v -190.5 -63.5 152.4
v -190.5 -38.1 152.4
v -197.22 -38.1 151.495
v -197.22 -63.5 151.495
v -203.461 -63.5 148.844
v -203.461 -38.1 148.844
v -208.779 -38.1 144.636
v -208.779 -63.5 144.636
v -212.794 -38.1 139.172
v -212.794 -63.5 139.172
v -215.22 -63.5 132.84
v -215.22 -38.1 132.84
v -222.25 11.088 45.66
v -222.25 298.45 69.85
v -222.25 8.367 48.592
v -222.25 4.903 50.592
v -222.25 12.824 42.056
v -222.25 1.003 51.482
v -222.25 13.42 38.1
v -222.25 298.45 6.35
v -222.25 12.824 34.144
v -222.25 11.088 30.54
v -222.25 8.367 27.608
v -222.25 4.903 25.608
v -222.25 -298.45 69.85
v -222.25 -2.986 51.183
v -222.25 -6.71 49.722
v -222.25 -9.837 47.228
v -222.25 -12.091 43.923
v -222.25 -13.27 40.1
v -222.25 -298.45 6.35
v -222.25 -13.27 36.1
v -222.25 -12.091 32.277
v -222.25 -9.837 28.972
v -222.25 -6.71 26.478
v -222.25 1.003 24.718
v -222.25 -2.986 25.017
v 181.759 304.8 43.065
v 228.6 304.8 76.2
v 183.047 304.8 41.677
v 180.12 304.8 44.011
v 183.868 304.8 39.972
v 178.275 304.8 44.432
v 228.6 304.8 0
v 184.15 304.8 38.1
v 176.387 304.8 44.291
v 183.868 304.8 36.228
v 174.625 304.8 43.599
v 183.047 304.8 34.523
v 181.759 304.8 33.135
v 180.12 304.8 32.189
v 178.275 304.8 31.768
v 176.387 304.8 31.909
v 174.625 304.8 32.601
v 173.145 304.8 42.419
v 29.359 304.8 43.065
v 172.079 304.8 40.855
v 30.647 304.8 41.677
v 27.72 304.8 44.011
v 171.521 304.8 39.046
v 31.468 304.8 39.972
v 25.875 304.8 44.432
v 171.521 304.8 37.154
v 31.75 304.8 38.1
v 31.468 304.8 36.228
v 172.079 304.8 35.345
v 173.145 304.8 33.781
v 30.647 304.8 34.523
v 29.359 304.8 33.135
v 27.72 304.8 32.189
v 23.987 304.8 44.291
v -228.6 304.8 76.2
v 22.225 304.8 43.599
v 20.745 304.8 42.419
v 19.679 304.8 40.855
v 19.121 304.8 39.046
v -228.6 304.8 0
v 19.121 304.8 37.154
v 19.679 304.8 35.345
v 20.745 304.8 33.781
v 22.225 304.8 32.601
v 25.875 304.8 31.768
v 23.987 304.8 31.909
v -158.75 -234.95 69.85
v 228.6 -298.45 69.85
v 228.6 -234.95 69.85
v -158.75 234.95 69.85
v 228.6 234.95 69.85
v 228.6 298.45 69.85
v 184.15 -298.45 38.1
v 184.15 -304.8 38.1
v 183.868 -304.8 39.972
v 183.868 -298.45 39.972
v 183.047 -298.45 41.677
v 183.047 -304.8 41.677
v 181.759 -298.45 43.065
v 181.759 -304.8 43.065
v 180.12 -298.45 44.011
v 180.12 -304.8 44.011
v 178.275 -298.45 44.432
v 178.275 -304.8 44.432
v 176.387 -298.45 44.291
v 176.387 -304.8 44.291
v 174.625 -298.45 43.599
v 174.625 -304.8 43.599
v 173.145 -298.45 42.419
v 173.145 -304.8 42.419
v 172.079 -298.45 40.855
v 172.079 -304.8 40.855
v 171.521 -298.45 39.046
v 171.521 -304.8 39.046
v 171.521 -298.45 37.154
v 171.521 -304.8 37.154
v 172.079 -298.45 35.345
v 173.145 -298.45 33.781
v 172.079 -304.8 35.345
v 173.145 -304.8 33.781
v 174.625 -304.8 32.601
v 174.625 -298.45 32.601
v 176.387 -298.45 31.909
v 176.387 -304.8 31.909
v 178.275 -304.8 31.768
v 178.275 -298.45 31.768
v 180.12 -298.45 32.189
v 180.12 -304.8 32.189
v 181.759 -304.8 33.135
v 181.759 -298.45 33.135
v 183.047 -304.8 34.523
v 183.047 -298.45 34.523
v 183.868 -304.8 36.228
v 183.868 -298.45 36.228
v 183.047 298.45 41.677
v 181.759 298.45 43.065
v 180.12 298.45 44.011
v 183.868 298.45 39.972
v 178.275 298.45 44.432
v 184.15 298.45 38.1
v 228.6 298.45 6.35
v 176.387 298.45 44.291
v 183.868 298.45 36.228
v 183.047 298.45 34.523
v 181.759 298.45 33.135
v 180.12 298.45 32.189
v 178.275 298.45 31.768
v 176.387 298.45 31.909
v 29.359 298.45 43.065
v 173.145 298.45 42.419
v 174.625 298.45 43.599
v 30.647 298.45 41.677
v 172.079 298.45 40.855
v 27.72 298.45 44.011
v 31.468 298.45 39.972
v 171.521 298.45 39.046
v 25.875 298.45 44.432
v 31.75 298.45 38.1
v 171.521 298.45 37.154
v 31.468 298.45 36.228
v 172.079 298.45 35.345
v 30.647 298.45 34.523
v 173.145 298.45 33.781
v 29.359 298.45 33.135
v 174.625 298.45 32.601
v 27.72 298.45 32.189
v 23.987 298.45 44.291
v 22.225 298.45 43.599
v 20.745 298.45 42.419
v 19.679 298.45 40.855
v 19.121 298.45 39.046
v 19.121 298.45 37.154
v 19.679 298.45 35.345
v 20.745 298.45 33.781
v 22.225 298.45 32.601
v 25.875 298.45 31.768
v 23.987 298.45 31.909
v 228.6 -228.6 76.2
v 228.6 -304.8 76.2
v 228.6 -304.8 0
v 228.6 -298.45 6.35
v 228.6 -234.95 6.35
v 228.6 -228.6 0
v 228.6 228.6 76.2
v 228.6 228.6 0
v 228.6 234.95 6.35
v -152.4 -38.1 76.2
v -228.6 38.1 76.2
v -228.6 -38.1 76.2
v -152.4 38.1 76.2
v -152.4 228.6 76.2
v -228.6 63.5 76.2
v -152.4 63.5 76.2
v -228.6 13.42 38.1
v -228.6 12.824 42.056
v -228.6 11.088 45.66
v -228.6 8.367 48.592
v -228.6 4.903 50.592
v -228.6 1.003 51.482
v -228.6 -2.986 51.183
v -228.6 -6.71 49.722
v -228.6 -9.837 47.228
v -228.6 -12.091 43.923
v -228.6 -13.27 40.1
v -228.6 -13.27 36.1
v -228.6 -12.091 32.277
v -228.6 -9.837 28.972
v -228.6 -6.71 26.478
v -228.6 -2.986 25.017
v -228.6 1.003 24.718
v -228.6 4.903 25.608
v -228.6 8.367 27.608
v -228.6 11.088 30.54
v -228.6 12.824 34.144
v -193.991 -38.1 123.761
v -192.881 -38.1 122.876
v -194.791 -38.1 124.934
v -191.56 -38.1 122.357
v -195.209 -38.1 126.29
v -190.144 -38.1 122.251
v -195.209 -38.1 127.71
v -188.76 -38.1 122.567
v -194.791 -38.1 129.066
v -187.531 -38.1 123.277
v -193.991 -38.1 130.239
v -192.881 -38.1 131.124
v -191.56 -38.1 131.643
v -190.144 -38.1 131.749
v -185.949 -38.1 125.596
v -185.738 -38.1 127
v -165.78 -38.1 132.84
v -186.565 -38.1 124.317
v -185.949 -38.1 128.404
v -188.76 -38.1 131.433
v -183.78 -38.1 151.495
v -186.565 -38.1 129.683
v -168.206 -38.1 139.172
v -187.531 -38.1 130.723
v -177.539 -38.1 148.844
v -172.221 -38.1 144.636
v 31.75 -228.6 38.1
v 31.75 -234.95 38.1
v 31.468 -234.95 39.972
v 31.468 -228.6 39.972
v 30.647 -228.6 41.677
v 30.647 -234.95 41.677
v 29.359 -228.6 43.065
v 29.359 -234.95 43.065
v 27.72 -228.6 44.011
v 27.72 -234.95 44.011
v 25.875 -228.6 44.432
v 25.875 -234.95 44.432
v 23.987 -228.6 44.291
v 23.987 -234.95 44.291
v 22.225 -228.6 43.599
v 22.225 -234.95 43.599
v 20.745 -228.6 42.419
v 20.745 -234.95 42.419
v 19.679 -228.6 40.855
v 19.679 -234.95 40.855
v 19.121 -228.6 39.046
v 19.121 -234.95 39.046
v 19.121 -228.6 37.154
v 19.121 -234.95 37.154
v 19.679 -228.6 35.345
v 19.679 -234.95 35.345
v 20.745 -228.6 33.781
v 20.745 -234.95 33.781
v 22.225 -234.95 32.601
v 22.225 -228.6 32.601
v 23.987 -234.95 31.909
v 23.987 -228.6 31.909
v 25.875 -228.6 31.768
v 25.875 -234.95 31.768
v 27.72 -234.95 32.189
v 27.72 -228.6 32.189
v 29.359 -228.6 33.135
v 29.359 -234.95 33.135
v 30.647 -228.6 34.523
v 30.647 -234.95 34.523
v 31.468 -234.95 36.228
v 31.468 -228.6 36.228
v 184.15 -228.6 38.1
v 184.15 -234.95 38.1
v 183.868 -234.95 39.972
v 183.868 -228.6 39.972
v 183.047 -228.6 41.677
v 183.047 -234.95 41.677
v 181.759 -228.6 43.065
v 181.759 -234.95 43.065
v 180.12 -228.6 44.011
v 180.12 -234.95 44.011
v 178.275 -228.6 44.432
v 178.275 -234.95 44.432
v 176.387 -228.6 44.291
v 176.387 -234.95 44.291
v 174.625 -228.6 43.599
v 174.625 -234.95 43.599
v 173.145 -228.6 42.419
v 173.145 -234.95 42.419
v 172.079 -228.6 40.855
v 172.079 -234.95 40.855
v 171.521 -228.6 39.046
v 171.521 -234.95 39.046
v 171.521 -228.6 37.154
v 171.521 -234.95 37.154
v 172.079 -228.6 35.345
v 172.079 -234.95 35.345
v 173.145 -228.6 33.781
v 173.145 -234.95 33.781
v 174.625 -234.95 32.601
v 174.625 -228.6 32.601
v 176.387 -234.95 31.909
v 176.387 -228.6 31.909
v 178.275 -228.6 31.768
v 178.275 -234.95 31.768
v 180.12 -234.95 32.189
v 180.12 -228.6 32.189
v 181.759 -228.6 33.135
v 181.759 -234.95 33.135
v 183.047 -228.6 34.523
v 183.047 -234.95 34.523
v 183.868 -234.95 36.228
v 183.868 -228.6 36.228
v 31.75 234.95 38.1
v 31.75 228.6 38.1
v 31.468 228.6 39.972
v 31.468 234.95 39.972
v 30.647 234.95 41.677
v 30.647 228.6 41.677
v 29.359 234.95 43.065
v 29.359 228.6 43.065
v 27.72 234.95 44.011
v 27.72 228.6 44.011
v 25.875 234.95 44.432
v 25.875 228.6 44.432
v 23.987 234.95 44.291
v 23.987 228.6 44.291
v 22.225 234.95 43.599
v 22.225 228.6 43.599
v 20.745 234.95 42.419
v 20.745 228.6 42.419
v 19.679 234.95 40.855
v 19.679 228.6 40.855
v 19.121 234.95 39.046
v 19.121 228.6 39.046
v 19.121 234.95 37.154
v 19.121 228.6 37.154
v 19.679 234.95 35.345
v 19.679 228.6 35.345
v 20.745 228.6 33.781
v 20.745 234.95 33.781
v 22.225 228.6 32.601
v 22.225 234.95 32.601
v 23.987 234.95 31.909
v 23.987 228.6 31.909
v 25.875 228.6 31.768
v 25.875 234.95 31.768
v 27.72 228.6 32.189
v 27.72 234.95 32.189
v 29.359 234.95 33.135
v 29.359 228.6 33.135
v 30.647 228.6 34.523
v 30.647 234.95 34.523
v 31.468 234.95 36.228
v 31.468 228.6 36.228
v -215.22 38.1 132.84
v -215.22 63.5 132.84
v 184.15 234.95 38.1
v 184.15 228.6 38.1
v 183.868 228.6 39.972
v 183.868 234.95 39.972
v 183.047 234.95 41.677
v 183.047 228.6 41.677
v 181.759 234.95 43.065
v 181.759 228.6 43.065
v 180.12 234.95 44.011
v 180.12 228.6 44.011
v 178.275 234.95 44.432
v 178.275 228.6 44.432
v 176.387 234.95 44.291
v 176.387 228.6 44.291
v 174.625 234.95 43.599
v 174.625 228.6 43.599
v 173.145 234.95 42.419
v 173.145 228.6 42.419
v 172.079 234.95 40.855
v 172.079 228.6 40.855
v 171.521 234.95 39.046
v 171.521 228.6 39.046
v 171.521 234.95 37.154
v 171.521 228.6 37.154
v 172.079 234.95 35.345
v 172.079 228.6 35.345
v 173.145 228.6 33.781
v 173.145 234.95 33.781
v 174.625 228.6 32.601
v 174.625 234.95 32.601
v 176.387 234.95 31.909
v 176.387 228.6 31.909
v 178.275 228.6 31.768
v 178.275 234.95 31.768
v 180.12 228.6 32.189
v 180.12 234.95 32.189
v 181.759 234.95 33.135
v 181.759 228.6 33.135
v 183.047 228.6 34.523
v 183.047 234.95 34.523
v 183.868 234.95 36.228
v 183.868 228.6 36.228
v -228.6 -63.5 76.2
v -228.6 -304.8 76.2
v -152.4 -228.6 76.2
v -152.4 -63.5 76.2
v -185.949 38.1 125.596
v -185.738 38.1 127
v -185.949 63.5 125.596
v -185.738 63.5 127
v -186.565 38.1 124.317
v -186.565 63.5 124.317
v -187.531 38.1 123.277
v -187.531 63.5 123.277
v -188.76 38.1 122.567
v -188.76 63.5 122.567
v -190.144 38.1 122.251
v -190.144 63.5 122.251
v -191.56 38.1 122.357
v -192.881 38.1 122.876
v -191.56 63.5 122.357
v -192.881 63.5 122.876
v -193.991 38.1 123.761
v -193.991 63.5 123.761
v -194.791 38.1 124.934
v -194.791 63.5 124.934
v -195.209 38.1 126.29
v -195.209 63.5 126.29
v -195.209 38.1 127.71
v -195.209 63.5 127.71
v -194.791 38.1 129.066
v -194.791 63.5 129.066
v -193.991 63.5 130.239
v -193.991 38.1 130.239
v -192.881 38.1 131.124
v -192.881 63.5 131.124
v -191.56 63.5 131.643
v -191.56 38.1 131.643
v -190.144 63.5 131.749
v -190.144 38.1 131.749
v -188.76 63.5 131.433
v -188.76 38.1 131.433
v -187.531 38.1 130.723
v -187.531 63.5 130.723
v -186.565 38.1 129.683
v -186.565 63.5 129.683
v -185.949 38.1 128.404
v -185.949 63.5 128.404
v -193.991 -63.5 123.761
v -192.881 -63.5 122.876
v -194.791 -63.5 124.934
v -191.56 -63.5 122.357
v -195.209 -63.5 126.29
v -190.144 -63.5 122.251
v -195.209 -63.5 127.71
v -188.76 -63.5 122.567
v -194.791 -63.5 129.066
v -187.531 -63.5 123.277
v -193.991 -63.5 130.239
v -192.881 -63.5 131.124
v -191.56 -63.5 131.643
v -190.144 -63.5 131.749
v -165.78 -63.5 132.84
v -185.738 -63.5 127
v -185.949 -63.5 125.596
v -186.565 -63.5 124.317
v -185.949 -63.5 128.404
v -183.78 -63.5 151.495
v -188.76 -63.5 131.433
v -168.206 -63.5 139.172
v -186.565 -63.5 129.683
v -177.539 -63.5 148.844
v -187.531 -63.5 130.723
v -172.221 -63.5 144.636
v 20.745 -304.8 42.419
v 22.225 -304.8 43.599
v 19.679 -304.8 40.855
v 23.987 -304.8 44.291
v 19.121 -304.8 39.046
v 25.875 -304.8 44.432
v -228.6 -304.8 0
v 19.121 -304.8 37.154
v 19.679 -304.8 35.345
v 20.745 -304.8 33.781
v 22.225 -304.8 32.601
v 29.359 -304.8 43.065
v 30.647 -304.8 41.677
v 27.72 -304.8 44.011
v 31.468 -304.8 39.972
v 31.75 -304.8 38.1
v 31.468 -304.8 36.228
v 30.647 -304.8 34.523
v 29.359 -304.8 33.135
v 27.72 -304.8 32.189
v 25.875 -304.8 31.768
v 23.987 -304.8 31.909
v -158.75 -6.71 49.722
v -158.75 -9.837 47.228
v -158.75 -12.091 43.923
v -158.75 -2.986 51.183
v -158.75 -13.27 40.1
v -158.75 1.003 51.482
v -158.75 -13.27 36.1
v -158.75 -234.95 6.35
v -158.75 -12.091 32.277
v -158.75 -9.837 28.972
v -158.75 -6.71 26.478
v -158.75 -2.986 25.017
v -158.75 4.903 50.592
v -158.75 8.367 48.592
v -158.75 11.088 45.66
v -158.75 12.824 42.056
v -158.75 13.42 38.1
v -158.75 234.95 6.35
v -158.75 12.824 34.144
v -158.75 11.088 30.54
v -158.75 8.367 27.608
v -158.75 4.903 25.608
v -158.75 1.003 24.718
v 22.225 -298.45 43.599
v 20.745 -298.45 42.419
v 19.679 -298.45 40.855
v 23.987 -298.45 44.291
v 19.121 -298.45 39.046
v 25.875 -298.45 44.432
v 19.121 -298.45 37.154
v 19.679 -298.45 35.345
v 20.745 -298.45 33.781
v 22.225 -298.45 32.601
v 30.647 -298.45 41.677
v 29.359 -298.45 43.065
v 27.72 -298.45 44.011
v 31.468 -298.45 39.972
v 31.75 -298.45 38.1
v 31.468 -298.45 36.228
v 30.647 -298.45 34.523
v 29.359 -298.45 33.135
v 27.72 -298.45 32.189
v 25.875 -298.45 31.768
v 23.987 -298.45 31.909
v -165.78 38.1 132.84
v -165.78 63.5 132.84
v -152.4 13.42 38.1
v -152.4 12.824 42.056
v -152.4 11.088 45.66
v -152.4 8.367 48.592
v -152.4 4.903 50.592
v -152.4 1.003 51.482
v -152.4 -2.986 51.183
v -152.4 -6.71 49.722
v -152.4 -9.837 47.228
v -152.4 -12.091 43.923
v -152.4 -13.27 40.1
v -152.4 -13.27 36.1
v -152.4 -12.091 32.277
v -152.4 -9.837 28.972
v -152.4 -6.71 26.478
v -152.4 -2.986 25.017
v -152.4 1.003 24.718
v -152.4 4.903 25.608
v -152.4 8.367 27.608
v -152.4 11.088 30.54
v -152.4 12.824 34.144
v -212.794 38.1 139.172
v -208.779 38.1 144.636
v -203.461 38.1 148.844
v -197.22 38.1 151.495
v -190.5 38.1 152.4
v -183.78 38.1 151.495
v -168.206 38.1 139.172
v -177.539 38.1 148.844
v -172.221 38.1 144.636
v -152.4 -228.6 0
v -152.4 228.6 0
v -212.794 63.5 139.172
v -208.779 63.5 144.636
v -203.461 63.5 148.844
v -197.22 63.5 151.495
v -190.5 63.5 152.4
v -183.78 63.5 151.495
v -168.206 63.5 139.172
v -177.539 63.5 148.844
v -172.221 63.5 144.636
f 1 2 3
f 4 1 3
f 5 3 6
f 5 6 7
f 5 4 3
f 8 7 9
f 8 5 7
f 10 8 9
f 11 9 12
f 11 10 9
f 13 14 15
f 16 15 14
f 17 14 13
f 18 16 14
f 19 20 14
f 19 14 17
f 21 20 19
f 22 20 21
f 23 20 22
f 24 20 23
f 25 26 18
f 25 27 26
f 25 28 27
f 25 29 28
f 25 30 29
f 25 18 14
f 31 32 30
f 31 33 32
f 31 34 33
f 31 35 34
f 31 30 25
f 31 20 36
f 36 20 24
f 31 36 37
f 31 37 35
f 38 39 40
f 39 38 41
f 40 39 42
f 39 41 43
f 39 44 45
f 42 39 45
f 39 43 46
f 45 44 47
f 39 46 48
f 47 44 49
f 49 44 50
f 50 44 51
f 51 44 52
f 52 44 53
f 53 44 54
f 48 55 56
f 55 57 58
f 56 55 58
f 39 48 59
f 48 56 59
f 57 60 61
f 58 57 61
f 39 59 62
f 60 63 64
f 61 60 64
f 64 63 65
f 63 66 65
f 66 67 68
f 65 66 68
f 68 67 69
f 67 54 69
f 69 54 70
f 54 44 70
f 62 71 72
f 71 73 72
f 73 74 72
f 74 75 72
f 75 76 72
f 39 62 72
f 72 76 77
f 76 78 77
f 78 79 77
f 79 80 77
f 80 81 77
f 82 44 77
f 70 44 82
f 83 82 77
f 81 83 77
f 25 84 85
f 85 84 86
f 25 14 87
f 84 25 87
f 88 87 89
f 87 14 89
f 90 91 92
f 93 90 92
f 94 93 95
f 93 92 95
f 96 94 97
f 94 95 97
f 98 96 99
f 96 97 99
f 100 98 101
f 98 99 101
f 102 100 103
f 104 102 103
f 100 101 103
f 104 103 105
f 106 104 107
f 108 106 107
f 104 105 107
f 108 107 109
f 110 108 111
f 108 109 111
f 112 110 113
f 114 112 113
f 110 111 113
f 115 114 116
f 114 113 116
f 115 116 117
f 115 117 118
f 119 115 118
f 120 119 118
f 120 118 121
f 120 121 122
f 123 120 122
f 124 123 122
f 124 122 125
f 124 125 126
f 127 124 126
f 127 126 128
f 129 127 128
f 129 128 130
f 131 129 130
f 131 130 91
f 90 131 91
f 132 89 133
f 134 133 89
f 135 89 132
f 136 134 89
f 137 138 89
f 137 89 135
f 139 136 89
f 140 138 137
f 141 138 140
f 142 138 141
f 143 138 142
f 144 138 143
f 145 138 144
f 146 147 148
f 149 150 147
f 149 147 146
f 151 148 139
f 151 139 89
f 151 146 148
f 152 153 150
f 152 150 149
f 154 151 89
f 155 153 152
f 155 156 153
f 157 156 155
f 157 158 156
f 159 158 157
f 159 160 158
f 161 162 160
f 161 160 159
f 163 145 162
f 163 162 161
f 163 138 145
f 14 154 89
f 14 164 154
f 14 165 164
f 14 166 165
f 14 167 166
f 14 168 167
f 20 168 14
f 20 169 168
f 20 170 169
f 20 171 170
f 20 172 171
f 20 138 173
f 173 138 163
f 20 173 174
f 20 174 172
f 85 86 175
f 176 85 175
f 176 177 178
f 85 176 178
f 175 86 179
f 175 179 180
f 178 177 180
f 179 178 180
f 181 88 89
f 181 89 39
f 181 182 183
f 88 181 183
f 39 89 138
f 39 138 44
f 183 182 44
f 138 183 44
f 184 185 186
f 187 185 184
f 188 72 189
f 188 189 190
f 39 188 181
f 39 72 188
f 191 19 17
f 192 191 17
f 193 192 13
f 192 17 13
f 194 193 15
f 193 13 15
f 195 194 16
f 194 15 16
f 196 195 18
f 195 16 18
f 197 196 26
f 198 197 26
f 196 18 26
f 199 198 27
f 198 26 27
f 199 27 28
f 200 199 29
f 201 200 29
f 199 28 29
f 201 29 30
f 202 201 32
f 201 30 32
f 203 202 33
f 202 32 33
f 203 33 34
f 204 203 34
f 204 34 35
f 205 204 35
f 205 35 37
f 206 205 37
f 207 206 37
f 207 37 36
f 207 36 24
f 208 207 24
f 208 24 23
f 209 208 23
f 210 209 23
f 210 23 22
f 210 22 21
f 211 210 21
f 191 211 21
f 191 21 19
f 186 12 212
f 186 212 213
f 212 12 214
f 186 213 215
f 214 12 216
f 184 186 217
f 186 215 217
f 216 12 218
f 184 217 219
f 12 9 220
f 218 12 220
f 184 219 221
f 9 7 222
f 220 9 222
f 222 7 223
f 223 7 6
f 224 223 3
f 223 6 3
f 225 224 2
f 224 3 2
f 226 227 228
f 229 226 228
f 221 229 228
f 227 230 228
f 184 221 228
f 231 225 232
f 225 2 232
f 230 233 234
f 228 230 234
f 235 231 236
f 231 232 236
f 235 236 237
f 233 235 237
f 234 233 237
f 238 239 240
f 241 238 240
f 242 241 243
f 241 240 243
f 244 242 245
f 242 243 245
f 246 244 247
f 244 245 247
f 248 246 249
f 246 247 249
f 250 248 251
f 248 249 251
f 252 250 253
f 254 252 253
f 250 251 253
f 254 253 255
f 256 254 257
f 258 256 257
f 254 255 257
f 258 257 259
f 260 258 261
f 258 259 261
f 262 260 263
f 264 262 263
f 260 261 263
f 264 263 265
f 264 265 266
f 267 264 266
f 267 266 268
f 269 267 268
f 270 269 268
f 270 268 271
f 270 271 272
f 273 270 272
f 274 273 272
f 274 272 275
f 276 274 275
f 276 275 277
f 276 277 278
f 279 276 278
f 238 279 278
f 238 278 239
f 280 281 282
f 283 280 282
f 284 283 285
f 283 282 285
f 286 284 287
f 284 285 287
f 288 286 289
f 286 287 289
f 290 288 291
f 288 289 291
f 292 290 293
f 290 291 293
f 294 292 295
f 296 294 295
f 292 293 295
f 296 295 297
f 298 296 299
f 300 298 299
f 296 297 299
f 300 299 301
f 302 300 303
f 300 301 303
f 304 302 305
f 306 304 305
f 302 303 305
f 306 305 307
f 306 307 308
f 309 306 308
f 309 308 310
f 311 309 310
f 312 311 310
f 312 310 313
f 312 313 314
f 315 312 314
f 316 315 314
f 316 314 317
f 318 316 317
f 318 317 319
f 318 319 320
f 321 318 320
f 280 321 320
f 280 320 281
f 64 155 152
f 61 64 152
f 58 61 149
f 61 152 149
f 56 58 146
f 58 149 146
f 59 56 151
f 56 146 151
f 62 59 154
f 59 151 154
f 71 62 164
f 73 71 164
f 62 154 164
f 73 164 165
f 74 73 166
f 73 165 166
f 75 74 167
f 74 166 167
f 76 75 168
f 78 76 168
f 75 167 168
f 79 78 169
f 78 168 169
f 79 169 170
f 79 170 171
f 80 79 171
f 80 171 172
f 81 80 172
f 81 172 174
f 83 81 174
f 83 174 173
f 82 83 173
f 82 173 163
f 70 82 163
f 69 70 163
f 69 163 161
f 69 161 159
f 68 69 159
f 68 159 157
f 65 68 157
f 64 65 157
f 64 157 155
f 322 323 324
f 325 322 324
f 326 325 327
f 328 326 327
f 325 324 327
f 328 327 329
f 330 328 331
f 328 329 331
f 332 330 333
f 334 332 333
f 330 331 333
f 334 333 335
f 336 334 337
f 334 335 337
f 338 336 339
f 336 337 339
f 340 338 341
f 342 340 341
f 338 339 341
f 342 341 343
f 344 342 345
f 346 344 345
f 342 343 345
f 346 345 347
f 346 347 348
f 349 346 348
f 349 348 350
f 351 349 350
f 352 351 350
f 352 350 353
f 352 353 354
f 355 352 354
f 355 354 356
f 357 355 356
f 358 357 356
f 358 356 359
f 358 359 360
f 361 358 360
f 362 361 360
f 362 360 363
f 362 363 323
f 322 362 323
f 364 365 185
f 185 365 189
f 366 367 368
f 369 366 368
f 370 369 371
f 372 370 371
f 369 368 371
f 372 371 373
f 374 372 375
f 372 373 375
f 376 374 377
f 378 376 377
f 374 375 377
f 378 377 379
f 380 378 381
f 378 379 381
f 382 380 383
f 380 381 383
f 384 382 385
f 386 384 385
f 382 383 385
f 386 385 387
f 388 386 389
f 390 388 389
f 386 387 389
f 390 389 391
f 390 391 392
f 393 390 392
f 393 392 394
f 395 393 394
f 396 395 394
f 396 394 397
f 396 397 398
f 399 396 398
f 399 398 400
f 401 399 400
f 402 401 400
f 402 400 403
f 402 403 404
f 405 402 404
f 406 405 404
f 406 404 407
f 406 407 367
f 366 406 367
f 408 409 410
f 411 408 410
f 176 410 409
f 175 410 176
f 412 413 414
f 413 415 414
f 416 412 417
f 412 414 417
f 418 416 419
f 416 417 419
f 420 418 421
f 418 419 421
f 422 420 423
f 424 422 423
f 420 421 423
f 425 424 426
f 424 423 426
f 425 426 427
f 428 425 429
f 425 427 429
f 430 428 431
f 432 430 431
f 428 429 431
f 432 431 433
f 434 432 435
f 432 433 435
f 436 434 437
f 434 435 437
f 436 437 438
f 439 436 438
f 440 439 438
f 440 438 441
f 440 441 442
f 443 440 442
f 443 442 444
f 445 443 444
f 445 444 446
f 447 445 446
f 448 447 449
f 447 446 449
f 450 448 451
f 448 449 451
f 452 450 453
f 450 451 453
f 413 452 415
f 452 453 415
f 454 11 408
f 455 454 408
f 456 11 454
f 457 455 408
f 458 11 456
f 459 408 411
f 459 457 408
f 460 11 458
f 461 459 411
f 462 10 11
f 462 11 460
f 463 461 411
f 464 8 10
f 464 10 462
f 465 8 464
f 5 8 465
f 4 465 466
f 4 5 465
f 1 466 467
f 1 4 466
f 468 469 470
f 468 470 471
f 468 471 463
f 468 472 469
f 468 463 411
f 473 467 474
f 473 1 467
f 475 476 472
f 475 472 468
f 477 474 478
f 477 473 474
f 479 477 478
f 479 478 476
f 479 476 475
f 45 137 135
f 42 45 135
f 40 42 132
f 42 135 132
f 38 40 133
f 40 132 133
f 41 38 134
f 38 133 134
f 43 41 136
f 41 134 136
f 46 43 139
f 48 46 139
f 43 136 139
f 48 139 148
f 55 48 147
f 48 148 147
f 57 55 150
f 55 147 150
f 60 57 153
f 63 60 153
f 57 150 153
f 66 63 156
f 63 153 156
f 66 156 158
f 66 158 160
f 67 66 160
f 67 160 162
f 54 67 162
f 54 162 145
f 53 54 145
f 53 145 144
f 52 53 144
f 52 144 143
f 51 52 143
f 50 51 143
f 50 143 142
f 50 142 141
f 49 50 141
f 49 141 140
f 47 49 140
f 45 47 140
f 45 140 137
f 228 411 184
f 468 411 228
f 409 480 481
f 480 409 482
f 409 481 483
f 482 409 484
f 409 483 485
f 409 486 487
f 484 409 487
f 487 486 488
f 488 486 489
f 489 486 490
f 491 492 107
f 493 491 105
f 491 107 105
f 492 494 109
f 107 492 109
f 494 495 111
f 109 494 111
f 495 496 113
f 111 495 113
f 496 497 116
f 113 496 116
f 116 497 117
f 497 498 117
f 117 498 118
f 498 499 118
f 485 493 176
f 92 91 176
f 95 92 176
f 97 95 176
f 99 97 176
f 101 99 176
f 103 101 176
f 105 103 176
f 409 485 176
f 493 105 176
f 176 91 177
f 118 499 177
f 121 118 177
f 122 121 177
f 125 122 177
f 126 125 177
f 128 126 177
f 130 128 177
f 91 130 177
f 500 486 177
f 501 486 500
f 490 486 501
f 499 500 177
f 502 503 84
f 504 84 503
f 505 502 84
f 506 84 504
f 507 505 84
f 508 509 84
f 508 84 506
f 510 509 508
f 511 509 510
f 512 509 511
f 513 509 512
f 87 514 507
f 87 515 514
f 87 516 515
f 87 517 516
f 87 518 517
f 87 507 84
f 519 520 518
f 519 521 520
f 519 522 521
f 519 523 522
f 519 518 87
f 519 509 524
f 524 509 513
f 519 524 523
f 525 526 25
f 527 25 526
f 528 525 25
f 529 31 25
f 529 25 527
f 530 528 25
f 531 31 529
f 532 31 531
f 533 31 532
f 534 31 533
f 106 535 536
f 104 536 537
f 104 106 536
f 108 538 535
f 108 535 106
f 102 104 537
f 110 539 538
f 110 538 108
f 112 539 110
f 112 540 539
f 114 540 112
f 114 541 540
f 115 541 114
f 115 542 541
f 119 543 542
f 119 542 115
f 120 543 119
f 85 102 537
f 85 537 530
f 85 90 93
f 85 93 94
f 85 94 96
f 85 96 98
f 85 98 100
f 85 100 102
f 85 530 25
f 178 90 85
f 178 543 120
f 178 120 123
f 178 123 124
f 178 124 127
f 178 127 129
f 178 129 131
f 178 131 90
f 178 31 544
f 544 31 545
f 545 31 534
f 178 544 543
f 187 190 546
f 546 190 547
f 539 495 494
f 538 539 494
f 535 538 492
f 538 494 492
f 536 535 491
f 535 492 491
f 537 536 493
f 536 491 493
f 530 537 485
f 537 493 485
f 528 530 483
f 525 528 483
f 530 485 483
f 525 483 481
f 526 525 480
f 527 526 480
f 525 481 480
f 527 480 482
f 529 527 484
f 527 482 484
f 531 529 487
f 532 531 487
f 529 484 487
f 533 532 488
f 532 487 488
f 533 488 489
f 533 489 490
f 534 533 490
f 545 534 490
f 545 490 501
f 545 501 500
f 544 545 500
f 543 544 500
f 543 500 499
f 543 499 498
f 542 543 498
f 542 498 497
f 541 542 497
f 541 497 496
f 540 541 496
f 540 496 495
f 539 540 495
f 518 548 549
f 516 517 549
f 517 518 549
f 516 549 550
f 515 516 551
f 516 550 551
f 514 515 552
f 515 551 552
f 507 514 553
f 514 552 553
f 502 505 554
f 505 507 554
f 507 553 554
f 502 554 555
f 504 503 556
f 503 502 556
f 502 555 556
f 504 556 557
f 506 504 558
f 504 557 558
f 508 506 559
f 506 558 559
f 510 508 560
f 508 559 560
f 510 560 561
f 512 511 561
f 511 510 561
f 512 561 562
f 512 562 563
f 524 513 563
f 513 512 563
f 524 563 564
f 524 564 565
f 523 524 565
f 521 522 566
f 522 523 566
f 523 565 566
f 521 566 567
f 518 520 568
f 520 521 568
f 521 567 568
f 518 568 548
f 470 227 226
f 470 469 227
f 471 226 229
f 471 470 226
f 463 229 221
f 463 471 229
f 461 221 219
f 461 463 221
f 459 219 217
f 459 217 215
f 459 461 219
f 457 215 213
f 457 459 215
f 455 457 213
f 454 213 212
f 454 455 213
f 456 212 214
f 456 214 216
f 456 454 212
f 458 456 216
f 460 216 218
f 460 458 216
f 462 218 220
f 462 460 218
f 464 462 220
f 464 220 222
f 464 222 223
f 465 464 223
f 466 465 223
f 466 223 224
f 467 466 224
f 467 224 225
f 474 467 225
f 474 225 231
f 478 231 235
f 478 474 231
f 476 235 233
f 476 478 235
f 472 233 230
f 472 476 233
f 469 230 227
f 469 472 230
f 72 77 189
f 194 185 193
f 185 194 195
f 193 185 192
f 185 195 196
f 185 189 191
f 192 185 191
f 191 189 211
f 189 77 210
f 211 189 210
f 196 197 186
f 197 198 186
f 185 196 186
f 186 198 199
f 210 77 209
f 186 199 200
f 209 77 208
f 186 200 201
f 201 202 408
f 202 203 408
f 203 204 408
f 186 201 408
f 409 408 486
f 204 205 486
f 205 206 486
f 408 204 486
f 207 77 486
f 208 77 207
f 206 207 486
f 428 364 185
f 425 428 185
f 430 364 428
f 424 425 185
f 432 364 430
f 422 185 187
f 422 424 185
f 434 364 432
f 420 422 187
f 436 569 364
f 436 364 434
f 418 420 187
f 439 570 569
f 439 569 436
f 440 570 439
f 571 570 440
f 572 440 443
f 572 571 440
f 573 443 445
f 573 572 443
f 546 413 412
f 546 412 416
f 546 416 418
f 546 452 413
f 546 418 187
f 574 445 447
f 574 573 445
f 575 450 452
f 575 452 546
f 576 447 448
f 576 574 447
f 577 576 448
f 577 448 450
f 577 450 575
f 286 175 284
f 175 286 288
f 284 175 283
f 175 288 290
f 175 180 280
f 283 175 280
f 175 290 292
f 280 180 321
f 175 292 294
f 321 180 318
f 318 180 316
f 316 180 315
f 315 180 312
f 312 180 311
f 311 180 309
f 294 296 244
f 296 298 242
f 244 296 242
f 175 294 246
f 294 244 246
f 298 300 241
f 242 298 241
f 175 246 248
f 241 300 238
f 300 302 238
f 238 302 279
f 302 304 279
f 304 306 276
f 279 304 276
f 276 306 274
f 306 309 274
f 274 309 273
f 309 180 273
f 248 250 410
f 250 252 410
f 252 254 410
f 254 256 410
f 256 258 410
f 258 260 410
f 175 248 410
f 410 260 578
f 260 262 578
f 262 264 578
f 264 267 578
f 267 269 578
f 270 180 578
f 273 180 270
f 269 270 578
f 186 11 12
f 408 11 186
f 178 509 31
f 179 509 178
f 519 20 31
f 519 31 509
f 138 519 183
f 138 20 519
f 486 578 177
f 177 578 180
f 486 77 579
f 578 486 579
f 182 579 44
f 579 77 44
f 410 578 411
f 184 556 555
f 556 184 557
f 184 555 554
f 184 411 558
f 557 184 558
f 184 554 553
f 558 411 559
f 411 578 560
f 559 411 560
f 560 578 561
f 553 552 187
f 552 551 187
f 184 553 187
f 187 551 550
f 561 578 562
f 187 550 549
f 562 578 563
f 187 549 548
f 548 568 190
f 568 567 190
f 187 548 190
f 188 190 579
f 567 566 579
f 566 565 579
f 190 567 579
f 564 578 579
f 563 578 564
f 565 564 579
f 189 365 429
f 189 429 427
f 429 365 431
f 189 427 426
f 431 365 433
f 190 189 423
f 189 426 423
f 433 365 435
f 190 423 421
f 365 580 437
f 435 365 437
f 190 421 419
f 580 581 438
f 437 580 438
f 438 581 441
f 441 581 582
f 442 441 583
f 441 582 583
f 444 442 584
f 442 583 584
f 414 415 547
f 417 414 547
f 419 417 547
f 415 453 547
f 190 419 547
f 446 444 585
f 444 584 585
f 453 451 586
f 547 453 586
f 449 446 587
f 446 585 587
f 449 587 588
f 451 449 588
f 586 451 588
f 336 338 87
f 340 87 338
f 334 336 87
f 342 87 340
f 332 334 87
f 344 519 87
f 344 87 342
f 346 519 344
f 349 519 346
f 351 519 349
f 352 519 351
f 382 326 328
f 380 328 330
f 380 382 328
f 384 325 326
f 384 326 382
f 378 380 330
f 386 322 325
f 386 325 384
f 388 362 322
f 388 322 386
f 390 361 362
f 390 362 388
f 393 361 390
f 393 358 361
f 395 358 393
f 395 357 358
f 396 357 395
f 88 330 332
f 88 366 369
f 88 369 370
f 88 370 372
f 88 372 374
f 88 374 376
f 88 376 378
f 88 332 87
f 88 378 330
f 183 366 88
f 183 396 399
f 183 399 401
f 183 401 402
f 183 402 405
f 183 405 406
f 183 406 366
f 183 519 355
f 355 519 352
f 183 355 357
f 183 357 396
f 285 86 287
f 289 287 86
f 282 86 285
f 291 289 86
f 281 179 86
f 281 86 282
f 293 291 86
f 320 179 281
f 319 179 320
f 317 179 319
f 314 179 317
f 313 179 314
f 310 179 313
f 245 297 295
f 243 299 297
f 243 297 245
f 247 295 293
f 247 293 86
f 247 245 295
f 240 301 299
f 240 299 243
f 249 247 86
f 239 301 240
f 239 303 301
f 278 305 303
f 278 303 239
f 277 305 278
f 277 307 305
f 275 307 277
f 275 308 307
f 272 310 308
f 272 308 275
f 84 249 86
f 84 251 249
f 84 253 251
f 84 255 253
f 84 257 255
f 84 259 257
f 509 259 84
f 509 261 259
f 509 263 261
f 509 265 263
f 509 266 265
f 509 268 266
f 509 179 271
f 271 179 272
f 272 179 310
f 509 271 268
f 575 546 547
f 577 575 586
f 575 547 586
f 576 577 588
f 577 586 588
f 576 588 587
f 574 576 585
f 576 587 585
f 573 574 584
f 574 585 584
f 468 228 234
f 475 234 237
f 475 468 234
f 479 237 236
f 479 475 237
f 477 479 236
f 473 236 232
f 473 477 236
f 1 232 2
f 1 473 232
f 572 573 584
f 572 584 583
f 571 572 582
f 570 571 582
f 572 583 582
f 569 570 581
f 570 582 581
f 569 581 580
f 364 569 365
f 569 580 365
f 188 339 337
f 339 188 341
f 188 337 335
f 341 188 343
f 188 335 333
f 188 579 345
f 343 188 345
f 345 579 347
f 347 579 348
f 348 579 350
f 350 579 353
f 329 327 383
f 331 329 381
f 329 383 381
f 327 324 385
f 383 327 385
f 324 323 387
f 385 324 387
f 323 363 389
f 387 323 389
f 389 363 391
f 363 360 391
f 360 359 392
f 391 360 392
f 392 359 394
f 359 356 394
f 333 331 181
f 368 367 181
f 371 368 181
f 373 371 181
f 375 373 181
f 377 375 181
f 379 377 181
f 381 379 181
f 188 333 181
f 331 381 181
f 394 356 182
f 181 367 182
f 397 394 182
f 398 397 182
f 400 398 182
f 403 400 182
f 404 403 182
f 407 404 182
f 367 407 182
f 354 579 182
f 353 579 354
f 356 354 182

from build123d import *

# Parameters (mm, degrees)
F1_DEPTH = 76.2
F2_T     = -6.35
F4_D     = 12.7
F7_DEPTH = 12.7
F8_R     = 13.4197326433
F9_DEPTH = 228.601


# Not quite as in the source:
# - a feature names something its author has since deleted; it is built from what else it names


with BuildPart() as f1:
    # F0 (on Top) → F1 (new body)
    with BuildSketch(Plane.XY):
        Polygon((-228.6, 304.8), (-228.6, -304.8), (228.6, -304.8), (228.6, -228.6), (-152.4, -228.6), (-152.4, 228.6), (228.6, 228.6), (228.6, 304.8), align=None)
    extrude(amount=F1_DEPTH)

    # F2
    f2_openings = [f1.faces().sort_by_distance(p)[0] for p in [
        (228.6, -266.7, 38.1),
        (228.6, 266.7, 38.1),
    ]]
    offset(amount=F2_T, openings=f2_openings, kind=Kind.INTERSECTION)

    # F4 (through all)
    with Locations(Plane(origin=(0, 304.8, 0), x_dir=(-1, 0, 0), z_dir=(0, 1, 0))):
        with Locations((-177.8, 38.1), (-25.4, 38.1)):
            Hole(F4_D / 2)

    # F6 (on offset) → F7 (join, symmetric)
    with BuildSketch(Plane.XZ.offset(50.8)):
        with BuildLine():
            Line((-215.2195876243, 132.8396907182), (-228.6, 76.2))
            Line((-228.6, 76.2), (-190.5, 76.2))
            Line((-190.5, 76.2), (-190.5, 122.2375))
            ThreePointArc((-190.5, 122.2375), (-195.2625, 127), (-190.5, 131.7625))
            Line((-190.5, 131.7625), (-190.5, 152.4))
            ThreePointArc((-190.5, 152.4), (-206.2612159391, 146.9184354838), (-215.2195876243, 132.8396907182))
        make_face()
        with BuildLine():
            Line((-190.5, 122.2375), (-190.5, 76.2))
            Line((-190.5, 76.2), (-152.4, 76.2))
            Line((-152.4, 76.2), (-165.7804123757, 132.8396907182))
            ThreePointArc((-165.7804123757, 132.8396907182), (-174.7387840609, 146.9184354838), (-190.5, 152.4))
            Line((-190.5, 152.4), (-190.5, 131.7625))
            ThreePointArc((-190.5, 131.7625), (-187.1324039546, 130.3675960454), (-185.7375, 127))
            ThreePointArc((-185.7375, 127), (-187.1324039546, 123.6324039546), (-190.5, 122.2375))
        make_face()
    extrude(amount=F7_DEPTH, both=True)

    # F8 (on Right) → F9 (cut, through all)
    with BuildSketch(Plane.YZ):
        with Locations((0, 38.1)):
            Circle(F8_R)
    extrude(amount=-F9_DEPTH, mode=Mode.SUBTRACT)

    # F10: F1 across plane


with BuildPart() as f1_1:
    add(f1.part)
    add(f1.part.mirror(Plane.XZ))


solid = f1_1.part
